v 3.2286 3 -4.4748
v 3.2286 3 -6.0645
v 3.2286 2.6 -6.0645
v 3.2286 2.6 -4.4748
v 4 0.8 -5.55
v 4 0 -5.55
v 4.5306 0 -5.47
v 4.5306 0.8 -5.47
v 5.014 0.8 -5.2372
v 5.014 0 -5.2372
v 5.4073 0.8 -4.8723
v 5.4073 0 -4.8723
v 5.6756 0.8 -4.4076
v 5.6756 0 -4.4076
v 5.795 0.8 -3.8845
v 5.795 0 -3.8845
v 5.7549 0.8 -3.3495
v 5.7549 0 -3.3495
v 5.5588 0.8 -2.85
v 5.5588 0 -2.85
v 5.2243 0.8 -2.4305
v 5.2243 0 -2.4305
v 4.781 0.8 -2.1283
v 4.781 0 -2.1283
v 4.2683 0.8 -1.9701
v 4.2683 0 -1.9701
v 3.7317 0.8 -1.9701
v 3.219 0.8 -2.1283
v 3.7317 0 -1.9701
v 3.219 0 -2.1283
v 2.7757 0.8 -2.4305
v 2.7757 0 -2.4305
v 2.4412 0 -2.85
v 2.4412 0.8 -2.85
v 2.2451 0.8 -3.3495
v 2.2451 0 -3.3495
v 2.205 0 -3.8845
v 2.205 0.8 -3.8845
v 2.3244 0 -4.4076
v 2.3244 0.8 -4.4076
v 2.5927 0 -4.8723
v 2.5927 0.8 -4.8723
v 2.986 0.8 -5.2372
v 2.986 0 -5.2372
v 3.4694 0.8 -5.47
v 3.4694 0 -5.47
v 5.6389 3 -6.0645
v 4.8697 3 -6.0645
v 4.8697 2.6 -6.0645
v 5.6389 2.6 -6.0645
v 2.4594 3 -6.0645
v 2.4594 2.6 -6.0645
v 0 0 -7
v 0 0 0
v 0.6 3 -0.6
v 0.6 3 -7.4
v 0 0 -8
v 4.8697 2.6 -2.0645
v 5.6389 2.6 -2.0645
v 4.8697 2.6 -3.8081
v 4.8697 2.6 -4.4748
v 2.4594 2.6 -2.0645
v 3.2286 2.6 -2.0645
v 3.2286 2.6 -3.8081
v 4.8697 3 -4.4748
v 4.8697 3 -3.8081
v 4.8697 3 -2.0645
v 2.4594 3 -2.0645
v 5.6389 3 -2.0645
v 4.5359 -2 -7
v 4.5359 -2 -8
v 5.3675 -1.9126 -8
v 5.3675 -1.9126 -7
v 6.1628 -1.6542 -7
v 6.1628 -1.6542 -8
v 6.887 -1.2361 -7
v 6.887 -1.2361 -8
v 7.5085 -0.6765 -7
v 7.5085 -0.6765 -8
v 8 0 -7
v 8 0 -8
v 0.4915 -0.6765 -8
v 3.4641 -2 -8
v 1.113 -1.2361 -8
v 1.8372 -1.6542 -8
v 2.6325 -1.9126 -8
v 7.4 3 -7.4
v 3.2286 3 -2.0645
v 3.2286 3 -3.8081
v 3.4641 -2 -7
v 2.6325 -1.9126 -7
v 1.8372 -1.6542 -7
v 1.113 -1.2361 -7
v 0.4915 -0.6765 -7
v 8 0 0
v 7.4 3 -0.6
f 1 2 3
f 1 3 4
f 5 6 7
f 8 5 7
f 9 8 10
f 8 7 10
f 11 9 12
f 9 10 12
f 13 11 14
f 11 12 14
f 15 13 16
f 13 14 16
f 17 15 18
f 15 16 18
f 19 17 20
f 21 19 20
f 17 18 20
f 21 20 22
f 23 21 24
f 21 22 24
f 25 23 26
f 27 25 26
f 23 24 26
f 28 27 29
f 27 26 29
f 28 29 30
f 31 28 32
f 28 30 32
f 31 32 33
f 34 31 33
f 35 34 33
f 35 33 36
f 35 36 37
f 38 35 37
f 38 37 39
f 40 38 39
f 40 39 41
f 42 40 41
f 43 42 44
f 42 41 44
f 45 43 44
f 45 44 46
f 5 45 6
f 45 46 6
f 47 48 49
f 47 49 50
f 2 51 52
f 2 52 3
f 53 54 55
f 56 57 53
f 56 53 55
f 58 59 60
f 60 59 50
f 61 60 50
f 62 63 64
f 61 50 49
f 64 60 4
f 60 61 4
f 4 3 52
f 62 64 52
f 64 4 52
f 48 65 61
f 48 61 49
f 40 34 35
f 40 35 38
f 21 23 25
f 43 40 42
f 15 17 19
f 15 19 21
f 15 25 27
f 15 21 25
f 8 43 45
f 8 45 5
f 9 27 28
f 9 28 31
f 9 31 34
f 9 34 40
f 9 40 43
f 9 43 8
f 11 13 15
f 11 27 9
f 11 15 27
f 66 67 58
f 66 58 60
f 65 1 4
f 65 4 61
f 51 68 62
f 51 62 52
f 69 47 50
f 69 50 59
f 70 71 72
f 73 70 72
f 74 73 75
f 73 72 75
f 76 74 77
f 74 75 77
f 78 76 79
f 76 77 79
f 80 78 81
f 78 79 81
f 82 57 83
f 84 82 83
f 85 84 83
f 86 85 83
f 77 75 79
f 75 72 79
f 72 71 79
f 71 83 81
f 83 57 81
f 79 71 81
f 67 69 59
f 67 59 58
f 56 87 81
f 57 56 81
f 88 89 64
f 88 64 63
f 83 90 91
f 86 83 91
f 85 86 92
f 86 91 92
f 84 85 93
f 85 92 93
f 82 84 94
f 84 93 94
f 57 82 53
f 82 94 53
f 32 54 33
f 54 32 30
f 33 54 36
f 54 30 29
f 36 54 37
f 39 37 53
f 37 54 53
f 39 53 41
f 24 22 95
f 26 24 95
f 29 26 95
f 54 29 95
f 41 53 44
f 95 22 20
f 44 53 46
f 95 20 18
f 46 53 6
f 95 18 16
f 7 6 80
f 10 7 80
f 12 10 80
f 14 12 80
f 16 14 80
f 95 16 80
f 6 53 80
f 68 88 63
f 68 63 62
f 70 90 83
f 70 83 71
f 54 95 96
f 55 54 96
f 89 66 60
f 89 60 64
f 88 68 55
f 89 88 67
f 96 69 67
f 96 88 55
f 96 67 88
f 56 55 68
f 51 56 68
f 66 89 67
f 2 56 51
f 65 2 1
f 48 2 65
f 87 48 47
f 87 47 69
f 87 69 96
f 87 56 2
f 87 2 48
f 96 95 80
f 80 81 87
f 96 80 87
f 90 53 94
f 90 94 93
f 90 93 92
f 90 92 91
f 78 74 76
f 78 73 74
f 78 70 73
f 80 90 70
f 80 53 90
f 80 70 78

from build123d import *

# Parameters (mm, degrees)
SKETCH1_W               = 8
SKETCH1_H               = 8
BOSS_EXTRUDE1_DEPTH     = 3
CUT_EXTRUDE1_DEPTH      = 12.704699911
CUT_EXTRUDE1_DEPTH_BACK = 12.704699911
CUT_EXTRUDE2_DEPTH      = 11
SKETCH4_R               = 1.8
CUT_EXTRUDE3_DEPTH      = 0.8
SKETCH5_W               = 8
SKETCH5_H               = 1
BOSS_EXTRUDE2_DEPTH     = 2
FILLET1_R               = 4
CUT_EXTRUDE4_DEPTH      = 0.4


with BuildPart() as part:
    # Sketch1 → Boss-Extrude1 (new body)
    with BuildSketch(Plane(origin=(0, 0, 0), x_dir=(1, 0, 0), z_dir=(0, 1, 0))):
        with Locations((4, 4)):
            Rectangle(SKETCH1_W, SKETCH1_H)
    extrude(amount=BOSS_EXTRUDE1_DEPTH)

    # Sketch2 → Cut-Extrude1 (cut, two sides: drawn at the far end of the back side and taken through both)
    with BuildSketch(Plane.XY.offset(-CUT_EXTRUDE1_DEPTH_BACK)):
        Polygon((0, 0), (0.6, 3), (0, 3), align=None)
        Polygon((8, 0), (7.4, 3), (8, 3), align=None)
    extrude(amount=CUT_EXTRUDE1_DEPTH + CUT_EXTRUDE1_DEPTH_BACK, mode=Mode.SUBTRACT)

    # Sketch3 → Cut-Extrude2 (cut)
    with BuildSketch(Plane(origin=(0, 0, 0), x_dir=(0, 0, -1), z_dir=(1, 0, 0))):
        Polygon((0, 0), (0.6, 3), (0, 3), align=None)
        Polygon((8, 3), (7.4, 3), (8, 0), align=None)
    extrude(amount=CUT_EXTRUDE2_DEPTH, mode=Mode.SUBTRACT)

    # Sketch4 → Cut-Extrude3 (cut)
    with BuildSketch(Plane.XZ):
        with Locations(Location((4, -3.75, 0), (0, 0, 270))):
            Circle(SKETCH4_R)
    extrude(amount=-CUT_EXTRUDE3_DEPTH, mode=Mode.SUBTRACT)

    # Sketch5 → Boss-Extrude2 (add)
    with BuildSketch(Plane.XZ):
        with Locations((4, -7.5)):
            Rectangle(SKETCH5_W, SKETCH5_H)
    extrude(amount=BOSS_EXTRUDE2_DEPTH)

    # Fillet1
    # the kernel refuses this fillet: 4 mm, written as the material it takes off along each edge
    with BuildSketch(Plane(origin=(8, -2, -16.660254038), x_dir=(0, 1, 0), z_dir=(0, 0, 1)), Plane(origin=(0, -2, 1.660254038), x_dir=(0, 1, 0), z_dir=(0, 0, -1))) as fillet1_piece_1:
        with BuildLine():
            CenterArc((4, 3.464101615), FILLET1_R, 180, 60)
            Line((0, 3.464101615), (-0.08, 3.464101615))
            Line((-0.08, 3.464101615), (-0.08, 0))
            Line((-0.08, 0), (0, -0.08))
            ThreePointArc((0, -0.08), (1, -0.08), (1.96, -0.069282032))
            Line((1.96, -0.069282032), (2, 0))
        make_face()
    extrude(amount=18.320508076, mode=Mode.SUBTRACT)

    # Sketch6 → Cut-Extrude4 (cut)
    with BuildSketch(Plane(origin=(0, 3, 0), x_dir=(1, 0, 0), z_dir=(0, 1, 0))):
        Polygon((2.459405501, 2.064543337), (2.459405501, 6.064543337), (3.22863627, 6.064543337), (3.22863627, 4.474799747), (4.869661911, 4.474799747), (4.869661911, 6.064543337), (5.63889268, 6.064543337), (5.63889268, 2.064543337), (4.869661911, 2.064543337), (4.869661911, 3.80813308), (3.22863627, 3.80813308), (3.22863627, 2.064543337), align=None)
    extrude(amount=-CUT_EXTRUDE4_DEPTH, mode=Mode.SUBTRACT)


solid = part.part
